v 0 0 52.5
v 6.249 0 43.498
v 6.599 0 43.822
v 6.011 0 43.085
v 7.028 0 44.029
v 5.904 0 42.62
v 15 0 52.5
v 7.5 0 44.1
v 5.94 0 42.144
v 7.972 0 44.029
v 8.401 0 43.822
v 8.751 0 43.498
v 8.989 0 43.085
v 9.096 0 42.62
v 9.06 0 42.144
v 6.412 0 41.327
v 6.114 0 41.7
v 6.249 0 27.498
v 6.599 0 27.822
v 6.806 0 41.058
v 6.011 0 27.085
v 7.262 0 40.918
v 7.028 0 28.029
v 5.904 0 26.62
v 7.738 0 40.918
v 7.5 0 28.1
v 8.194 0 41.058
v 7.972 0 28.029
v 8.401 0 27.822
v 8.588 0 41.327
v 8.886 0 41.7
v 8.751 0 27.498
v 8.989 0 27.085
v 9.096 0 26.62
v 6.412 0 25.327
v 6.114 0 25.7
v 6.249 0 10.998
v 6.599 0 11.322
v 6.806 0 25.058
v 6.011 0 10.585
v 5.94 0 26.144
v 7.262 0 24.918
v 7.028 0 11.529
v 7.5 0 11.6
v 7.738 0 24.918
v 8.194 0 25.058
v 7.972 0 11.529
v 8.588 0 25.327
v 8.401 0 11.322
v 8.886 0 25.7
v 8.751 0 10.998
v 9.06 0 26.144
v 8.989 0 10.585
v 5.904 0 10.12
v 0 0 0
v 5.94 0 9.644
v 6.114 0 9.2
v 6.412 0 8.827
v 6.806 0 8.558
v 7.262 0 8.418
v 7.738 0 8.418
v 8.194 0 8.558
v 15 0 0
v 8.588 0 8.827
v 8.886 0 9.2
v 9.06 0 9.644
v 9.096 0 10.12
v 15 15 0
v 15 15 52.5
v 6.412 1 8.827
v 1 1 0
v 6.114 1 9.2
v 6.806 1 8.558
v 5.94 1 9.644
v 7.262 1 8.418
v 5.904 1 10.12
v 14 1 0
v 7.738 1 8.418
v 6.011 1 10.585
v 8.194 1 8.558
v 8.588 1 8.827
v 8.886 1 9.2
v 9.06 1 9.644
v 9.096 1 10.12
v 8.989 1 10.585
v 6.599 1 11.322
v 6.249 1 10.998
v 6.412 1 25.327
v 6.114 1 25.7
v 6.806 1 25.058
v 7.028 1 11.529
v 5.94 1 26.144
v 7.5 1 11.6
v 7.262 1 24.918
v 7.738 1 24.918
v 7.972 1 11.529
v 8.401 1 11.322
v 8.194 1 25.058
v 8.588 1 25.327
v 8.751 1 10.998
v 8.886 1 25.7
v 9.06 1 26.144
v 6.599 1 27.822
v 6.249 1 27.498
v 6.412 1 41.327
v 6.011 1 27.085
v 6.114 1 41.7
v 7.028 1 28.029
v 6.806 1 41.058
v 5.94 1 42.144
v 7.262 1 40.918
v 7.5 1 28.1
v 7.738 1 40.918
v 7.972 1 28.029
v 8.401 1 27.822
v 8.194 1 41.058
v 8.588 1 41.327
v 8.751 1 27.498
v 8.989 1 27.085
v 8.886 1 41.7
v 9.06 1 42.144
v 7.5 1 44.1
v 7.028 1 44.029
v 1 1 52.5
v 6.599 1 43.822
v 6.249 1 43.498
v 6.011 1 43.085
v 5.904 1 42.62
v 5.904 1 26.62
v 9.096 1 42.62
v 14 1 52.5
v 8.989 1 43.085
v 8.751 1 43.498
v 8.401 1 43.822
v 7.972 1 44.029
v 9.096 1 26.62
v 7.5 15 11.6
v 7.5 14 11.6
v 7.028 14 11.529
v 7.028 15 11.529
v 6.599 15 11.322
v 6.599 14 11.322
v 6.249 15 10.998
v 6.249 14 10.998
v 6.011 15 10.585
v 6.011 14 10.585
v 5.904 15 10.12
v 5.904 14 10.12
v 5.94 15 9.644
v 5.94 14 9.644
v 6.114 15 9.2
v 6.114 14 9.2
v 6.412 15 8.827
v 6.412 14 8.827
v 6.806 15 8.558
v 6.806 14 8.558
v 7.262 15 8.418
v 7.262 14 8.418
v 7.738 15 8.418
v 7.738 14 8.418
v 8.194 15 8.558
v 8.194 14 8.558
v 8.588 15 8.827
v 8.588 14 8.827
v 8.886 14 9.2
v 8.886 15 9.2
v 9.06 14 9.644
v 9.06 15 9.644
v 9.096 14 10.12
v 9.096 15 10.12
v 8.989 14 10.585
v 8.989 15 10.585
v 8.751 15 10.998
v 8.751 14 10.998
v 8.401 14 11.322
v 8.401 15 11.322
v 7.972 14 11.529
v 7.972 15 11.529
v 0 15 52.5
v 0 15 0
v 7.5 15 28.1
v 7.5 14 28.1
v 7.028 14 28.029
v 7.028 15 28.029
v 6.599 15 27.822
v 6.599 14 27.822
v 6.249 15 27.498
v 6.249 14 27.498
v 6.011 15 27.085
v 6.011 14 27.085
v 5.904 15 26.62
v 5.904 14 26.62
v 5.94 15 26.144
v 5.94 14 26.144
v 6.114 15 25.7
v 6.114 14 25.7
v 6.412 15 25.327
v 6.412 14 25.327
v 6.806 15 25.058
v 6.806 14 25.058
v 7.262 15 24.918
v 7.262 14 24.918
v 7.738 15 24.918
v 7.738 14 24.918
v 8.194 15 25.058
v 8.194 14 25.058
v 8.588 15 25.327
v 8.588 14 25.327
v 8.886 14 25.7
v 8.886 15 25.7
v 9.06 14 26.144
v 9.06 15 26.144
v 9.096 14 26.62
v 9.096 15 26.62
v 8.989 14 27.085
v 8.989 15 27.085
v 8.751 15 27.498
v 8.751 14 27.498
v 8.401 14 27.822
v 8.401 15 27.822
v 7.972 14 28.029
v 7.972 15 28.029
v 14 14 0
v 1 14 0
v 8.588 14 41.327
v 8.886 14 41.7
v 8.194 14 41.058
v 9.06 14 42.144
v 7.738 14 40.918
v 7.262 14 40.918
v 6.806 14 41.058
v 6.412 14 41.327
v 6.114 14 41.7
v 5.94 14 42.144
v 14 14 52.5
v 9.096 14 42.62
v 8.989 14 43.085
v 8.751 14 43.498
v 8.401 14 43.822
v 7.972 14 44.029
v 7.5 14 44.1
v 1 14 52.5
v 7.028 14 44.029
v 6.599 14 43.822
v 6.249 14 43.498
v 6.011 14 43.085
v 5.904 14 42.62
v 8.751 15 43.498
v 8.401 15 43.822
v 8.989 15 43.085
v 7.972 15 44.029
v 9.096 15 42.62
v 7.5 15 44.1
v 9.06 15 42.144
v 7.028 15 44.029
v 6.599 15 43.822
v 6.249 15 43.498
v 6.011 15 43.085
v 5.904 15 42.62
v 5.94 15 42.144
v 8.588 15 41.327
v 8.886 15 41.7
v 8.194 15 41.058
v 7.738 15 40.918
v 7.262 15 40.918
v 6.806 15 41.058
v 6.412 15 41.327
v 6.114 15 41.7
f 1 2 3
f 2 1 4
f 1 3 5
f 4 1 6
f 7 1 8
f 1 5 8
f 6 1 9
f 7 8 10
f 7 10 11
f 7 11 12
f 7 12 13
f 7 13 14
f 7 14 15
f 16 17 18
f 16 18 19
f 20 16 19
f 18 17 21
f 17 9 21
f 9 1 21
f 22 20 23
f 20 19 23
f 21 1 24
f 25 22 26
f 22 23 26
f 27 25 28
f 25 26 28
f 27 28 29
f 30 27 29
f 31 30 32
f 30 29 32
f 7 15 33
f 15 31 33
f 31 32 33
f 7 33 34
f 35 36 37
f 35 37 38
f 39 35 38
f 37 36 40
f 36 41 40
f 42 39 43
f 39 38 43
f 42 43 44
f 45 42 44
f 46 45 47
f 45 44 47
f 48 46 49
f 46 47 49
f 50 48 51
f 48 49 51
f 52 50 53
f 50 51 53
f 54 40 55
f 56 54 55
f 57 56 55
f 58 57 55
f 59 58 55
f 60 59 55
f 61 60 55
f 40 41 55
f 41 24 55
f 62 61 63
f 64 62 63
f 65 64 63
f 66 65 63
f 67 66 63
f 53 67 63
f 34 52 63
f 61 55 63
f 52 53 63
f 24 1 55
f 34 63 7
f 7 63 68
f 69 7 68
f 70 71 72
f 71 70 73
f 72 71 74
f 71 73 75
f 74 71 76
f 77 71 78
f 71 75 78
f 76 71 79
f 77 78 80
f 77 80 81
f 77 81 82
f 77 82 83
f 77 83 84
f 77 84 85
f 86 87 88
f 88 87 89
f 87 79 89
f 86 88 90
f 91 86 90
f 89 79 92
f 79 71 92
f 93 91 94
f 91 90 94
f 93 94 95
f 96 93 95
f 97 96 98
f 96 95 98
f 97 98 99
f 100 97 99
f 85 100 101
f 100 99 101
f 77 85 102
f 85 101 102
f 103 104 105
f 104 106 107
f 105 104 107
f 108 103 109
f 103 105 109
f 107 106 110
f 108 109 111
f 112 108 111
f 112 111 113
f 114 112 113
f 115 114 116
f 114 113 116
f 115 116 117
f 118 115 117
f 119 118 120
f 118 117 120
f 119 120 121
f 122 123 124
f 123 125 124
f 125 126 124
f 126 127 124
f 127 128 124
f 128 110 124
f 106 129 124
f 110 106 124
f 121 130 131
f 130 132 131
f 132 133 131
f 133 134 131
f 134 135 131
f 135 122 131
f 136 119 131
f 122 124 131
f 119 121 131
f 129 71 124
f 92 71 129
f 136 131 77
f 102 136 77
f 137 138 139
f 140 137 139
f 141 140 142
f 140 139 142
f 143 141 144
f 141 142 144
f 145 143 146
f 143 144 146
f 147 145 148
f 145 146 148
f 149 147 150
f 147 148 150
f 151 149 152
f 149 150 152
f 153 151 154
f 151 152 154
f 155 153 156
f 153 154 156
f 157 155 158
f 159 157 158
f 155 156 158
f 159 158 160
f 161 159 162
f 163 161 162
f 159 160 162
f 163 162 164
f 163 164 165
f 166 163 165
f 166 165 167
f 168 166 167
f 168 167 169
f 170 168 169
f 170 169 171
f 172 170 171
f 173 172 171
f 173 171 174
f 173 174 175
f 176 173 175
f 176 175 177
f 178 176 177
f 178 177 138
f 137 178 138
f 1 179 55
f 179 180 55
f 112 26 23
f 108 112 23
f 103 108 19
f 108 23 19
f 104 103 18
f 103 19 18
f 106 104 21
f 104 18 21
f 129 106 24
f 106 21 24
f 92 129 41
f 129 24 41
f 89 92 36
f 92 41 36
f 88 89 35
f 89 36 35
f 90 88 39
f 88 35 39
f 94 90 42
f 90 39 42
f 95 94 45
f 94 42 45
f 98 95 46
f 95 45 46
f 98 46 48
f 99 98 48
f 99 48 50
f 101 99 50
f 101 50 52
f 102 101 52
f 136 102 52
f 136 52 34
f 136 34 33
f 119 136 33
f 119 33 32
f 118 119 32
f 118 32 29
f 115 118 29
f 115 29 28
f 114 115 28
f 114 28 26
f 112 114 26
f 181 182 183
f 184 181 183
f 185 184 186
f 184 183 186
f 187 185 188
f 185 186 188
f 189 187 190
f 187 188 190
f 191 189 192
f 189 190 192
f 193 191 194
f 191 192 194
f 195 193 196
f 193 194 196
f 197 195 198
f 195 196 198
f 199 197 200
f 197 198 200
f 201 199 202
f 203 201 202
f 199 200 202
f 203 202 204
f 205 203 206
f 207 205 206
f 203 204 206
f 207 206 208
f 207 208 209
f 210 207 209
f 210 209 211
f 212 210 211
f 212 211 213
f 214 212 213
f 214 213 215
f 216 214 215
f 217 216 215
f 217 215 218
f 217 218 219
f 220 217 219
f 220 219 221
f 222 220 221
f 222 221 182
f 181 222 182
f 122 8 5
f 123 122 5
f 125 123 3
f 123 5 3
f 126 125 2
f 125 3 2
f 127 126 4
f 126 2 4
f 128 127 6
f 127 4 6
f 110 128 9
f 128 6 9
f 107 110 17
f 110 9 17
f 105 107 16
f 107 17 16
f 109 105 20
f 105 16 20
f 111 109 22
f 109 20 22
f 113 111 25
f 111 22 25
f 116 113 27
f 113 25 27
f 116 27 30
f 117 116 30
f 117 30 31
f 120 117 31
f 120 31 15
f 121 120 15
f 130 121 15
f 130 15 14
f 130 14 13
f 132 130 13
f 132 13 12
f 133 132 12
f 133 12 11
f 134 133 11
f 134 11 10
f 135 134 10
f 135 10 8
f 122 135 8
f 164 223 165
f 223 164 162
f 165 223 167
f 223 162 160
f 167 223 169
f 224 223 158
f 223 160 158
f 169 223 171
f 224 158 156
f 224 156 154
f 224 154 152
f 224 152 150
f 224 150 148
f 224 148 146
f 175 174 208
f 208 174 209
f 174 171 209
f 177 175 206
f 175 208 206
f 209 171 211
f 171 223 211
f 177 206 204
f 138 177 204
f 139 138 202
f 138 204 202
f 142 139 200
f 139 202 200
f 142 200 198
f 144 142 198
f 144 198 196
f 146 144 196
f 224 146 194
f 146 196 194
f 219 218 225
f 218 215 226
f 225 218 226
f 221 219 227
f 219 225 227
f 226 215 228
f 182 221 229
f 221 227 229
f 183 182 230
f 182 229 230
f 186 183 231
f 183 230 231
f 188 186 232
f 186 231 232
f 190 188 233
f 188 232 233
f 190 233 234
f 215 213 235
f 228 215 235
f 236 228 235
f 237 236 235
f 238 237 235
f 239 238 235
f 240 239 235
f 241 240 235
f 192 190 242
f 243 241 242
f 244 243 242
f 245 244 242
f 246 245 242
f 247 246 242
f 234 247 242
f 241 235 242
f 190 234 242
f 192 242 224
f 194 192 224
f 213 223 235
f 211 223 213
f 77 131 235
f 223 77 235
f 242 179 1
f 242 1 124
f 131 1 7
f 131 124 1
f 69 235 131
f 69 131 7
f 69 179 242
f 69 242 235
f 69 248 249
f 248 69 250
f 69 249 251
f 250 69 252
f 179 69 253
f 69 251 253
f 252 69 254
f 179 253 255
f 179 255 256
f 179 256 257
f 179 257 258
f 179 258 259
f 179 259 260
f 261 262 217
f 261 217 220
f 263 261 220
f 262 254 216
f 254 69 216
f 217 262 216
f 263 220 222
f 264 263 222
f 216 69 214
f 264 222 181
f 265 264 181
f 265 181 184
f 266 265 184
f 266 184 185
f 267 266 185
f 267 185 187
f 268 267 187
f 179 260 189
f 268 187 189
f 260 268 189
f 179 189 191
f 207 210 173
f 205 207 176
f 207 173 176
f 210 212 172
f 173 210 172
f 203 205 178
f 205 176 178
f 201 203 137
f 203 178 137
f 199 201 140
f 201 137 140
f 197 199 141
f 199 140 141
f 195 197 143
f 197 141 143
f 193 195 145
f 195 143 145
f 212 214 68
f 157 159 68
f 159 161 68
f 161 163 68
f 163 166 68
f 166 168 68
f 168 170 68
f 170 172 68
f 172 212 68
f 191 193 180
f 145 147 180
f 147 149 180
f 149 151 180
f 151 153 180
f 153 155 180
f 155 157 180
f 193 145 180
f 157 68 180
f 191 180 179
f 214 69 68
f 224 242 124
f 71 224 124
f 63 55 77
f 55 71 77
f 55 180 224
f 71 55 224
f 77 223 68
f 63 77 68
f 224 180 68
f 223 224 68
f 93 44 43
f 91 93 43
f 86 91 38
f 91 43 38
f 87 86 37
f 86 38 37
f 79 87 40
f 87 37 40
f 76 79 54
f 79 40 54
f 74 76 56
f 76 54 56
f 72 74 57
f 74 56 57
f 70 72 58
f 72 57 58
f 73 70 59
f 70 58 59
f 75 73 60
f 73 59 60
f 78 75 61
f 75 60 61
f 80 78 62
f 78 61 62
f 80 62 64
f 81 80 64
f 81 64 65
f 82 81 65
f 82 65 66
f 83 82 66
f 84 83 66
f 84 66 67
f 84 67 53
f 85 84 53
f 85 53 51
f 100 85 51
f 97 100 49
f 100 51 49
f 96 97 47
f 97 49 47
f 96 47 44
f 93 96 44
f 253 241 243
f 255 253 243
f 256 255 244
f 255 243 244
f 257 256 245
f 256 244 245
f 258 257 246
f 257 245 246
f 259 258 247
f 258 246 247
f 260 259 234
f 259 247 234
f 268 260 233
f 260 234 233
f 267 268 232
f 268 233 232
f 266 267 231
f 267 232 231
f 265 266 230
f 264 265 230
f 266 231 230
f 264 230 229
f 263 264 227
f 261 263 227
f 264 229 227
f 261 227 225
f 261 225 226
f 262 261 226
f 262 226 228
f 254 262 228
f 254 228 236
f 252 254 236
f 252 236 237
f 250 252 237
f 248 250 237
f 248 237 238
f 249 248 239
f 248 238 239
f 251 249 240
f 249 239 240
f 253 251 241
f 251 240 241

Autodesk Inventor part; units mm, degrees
ref_plane "YZ Plane" through (0, 0, 0) normal (1, 0, 0) x (0, 1, 0)
ref_plane "XZ Plane" through (0, 0, 0) normal (0, 1, 0) x (-1, 0, 0)
ref_plane "XY Plane" through (0, 0, 0) normal (0, 0, 1) x (1, 0, 0)
sketch "スケッチ1" plane through (0, 0, 0) normal (0, 0, 1) x (1, 0, 0)
  line L0 (0, 0) -> (15, 0)
  line L1 (15, 0) -> (15, 15)
  line L2 (15, 15) -> (0, 15)
  line L3 (0, 15) -> (0, 0)
  dimension "d0" = 15
  dimension "d1" = 15
extrude "押し出し1" add sketch "スケッチ1" along normal blind 52.5
sketch "スケッチ2" plane through (0, 0, 52.5) normal (0, 0, 1) x (1, 0, 0)
  point P0 (0, 0)
sketch "スケッチ3" plane through (0, 0, 52.5) normal (0, 0, 1) x (1, 0, 0)
  line L0 (1, 1) -> (14, 1)
  line L1 (14, 1) -> (14, 14)
  line L2 (14, 14) -> (1, 14)
  line L3 (1, 14) -> (1, 1)
  line L4 (15, 15) -> (0, 15) projected
  line L5 (15, 0) -> (15, 15) projected
  point P0 (0, 0)
  dimension "d4" = 13
  dimension "d5" = 13
  dimension "d6" = 1
  dimension "d7" = 1
extrude "押し出し2" cut sketch "スケッチ3" against normal blind 52.5
sketch "スケッチ4" plane through (0, 15, 0) normal (0, 1, 0) x (1, 0, 0)
  circle A0 centre (7.5, -42.5) radius 1.6
  line L0 (15, -52.5) -> (0, -52.5) projected
  line L1 (15, 0) -> (15, -52.5) projected
  circle A1 centre (7.5, -10) radius 1.6
  line L2 (15, 0) -> (0, 0) projected
  circle A2 centre (7.5, -26.5) radius 1.6
  dimension "d10" = 3.2
  dimension "d11" = 10
  dimension "d12" = 7.5
  dimension "d13" = 3.2
  dimension "d14" = 10
  dimension "d15" = 7.5
  dimension "d16" = 3.2
  dimension "d17" = 16
  dimension "d18" = 16.5
hole "穴1" at (7.5, 15, 26.5) at (7.5, 15, 10) at (7.5, 15, 42.5) direction (0, -1, 0) diameter 3.2 depth 15
sketch "スケッチ5" plane through (0, 0, 52.5) normal (0, 0, 1) x (1, 0, 0)
  point P0 (0, 0)
  point P1 (7.773, 13.9735)
equation "\"BendRadius\" = Thickness"
equation "\"BendReliefWidth\" = Thickness"
equation "\"BendReliefDepth\" = 0.5 * Thickness"
equation "\"CornerReliefSize\" = 4 * Thickness"
equation "\"MinimumRemnant\" = 2 * Thickness"
equation "\"TransitionRadius\" = BendRadius"
equation "\"JacobiRadiusSize\" = BendRadius"
equation "\"GapSize\" = Thickness"
equation "\"Thickness\" = 0.5"
properties part number "足2"
